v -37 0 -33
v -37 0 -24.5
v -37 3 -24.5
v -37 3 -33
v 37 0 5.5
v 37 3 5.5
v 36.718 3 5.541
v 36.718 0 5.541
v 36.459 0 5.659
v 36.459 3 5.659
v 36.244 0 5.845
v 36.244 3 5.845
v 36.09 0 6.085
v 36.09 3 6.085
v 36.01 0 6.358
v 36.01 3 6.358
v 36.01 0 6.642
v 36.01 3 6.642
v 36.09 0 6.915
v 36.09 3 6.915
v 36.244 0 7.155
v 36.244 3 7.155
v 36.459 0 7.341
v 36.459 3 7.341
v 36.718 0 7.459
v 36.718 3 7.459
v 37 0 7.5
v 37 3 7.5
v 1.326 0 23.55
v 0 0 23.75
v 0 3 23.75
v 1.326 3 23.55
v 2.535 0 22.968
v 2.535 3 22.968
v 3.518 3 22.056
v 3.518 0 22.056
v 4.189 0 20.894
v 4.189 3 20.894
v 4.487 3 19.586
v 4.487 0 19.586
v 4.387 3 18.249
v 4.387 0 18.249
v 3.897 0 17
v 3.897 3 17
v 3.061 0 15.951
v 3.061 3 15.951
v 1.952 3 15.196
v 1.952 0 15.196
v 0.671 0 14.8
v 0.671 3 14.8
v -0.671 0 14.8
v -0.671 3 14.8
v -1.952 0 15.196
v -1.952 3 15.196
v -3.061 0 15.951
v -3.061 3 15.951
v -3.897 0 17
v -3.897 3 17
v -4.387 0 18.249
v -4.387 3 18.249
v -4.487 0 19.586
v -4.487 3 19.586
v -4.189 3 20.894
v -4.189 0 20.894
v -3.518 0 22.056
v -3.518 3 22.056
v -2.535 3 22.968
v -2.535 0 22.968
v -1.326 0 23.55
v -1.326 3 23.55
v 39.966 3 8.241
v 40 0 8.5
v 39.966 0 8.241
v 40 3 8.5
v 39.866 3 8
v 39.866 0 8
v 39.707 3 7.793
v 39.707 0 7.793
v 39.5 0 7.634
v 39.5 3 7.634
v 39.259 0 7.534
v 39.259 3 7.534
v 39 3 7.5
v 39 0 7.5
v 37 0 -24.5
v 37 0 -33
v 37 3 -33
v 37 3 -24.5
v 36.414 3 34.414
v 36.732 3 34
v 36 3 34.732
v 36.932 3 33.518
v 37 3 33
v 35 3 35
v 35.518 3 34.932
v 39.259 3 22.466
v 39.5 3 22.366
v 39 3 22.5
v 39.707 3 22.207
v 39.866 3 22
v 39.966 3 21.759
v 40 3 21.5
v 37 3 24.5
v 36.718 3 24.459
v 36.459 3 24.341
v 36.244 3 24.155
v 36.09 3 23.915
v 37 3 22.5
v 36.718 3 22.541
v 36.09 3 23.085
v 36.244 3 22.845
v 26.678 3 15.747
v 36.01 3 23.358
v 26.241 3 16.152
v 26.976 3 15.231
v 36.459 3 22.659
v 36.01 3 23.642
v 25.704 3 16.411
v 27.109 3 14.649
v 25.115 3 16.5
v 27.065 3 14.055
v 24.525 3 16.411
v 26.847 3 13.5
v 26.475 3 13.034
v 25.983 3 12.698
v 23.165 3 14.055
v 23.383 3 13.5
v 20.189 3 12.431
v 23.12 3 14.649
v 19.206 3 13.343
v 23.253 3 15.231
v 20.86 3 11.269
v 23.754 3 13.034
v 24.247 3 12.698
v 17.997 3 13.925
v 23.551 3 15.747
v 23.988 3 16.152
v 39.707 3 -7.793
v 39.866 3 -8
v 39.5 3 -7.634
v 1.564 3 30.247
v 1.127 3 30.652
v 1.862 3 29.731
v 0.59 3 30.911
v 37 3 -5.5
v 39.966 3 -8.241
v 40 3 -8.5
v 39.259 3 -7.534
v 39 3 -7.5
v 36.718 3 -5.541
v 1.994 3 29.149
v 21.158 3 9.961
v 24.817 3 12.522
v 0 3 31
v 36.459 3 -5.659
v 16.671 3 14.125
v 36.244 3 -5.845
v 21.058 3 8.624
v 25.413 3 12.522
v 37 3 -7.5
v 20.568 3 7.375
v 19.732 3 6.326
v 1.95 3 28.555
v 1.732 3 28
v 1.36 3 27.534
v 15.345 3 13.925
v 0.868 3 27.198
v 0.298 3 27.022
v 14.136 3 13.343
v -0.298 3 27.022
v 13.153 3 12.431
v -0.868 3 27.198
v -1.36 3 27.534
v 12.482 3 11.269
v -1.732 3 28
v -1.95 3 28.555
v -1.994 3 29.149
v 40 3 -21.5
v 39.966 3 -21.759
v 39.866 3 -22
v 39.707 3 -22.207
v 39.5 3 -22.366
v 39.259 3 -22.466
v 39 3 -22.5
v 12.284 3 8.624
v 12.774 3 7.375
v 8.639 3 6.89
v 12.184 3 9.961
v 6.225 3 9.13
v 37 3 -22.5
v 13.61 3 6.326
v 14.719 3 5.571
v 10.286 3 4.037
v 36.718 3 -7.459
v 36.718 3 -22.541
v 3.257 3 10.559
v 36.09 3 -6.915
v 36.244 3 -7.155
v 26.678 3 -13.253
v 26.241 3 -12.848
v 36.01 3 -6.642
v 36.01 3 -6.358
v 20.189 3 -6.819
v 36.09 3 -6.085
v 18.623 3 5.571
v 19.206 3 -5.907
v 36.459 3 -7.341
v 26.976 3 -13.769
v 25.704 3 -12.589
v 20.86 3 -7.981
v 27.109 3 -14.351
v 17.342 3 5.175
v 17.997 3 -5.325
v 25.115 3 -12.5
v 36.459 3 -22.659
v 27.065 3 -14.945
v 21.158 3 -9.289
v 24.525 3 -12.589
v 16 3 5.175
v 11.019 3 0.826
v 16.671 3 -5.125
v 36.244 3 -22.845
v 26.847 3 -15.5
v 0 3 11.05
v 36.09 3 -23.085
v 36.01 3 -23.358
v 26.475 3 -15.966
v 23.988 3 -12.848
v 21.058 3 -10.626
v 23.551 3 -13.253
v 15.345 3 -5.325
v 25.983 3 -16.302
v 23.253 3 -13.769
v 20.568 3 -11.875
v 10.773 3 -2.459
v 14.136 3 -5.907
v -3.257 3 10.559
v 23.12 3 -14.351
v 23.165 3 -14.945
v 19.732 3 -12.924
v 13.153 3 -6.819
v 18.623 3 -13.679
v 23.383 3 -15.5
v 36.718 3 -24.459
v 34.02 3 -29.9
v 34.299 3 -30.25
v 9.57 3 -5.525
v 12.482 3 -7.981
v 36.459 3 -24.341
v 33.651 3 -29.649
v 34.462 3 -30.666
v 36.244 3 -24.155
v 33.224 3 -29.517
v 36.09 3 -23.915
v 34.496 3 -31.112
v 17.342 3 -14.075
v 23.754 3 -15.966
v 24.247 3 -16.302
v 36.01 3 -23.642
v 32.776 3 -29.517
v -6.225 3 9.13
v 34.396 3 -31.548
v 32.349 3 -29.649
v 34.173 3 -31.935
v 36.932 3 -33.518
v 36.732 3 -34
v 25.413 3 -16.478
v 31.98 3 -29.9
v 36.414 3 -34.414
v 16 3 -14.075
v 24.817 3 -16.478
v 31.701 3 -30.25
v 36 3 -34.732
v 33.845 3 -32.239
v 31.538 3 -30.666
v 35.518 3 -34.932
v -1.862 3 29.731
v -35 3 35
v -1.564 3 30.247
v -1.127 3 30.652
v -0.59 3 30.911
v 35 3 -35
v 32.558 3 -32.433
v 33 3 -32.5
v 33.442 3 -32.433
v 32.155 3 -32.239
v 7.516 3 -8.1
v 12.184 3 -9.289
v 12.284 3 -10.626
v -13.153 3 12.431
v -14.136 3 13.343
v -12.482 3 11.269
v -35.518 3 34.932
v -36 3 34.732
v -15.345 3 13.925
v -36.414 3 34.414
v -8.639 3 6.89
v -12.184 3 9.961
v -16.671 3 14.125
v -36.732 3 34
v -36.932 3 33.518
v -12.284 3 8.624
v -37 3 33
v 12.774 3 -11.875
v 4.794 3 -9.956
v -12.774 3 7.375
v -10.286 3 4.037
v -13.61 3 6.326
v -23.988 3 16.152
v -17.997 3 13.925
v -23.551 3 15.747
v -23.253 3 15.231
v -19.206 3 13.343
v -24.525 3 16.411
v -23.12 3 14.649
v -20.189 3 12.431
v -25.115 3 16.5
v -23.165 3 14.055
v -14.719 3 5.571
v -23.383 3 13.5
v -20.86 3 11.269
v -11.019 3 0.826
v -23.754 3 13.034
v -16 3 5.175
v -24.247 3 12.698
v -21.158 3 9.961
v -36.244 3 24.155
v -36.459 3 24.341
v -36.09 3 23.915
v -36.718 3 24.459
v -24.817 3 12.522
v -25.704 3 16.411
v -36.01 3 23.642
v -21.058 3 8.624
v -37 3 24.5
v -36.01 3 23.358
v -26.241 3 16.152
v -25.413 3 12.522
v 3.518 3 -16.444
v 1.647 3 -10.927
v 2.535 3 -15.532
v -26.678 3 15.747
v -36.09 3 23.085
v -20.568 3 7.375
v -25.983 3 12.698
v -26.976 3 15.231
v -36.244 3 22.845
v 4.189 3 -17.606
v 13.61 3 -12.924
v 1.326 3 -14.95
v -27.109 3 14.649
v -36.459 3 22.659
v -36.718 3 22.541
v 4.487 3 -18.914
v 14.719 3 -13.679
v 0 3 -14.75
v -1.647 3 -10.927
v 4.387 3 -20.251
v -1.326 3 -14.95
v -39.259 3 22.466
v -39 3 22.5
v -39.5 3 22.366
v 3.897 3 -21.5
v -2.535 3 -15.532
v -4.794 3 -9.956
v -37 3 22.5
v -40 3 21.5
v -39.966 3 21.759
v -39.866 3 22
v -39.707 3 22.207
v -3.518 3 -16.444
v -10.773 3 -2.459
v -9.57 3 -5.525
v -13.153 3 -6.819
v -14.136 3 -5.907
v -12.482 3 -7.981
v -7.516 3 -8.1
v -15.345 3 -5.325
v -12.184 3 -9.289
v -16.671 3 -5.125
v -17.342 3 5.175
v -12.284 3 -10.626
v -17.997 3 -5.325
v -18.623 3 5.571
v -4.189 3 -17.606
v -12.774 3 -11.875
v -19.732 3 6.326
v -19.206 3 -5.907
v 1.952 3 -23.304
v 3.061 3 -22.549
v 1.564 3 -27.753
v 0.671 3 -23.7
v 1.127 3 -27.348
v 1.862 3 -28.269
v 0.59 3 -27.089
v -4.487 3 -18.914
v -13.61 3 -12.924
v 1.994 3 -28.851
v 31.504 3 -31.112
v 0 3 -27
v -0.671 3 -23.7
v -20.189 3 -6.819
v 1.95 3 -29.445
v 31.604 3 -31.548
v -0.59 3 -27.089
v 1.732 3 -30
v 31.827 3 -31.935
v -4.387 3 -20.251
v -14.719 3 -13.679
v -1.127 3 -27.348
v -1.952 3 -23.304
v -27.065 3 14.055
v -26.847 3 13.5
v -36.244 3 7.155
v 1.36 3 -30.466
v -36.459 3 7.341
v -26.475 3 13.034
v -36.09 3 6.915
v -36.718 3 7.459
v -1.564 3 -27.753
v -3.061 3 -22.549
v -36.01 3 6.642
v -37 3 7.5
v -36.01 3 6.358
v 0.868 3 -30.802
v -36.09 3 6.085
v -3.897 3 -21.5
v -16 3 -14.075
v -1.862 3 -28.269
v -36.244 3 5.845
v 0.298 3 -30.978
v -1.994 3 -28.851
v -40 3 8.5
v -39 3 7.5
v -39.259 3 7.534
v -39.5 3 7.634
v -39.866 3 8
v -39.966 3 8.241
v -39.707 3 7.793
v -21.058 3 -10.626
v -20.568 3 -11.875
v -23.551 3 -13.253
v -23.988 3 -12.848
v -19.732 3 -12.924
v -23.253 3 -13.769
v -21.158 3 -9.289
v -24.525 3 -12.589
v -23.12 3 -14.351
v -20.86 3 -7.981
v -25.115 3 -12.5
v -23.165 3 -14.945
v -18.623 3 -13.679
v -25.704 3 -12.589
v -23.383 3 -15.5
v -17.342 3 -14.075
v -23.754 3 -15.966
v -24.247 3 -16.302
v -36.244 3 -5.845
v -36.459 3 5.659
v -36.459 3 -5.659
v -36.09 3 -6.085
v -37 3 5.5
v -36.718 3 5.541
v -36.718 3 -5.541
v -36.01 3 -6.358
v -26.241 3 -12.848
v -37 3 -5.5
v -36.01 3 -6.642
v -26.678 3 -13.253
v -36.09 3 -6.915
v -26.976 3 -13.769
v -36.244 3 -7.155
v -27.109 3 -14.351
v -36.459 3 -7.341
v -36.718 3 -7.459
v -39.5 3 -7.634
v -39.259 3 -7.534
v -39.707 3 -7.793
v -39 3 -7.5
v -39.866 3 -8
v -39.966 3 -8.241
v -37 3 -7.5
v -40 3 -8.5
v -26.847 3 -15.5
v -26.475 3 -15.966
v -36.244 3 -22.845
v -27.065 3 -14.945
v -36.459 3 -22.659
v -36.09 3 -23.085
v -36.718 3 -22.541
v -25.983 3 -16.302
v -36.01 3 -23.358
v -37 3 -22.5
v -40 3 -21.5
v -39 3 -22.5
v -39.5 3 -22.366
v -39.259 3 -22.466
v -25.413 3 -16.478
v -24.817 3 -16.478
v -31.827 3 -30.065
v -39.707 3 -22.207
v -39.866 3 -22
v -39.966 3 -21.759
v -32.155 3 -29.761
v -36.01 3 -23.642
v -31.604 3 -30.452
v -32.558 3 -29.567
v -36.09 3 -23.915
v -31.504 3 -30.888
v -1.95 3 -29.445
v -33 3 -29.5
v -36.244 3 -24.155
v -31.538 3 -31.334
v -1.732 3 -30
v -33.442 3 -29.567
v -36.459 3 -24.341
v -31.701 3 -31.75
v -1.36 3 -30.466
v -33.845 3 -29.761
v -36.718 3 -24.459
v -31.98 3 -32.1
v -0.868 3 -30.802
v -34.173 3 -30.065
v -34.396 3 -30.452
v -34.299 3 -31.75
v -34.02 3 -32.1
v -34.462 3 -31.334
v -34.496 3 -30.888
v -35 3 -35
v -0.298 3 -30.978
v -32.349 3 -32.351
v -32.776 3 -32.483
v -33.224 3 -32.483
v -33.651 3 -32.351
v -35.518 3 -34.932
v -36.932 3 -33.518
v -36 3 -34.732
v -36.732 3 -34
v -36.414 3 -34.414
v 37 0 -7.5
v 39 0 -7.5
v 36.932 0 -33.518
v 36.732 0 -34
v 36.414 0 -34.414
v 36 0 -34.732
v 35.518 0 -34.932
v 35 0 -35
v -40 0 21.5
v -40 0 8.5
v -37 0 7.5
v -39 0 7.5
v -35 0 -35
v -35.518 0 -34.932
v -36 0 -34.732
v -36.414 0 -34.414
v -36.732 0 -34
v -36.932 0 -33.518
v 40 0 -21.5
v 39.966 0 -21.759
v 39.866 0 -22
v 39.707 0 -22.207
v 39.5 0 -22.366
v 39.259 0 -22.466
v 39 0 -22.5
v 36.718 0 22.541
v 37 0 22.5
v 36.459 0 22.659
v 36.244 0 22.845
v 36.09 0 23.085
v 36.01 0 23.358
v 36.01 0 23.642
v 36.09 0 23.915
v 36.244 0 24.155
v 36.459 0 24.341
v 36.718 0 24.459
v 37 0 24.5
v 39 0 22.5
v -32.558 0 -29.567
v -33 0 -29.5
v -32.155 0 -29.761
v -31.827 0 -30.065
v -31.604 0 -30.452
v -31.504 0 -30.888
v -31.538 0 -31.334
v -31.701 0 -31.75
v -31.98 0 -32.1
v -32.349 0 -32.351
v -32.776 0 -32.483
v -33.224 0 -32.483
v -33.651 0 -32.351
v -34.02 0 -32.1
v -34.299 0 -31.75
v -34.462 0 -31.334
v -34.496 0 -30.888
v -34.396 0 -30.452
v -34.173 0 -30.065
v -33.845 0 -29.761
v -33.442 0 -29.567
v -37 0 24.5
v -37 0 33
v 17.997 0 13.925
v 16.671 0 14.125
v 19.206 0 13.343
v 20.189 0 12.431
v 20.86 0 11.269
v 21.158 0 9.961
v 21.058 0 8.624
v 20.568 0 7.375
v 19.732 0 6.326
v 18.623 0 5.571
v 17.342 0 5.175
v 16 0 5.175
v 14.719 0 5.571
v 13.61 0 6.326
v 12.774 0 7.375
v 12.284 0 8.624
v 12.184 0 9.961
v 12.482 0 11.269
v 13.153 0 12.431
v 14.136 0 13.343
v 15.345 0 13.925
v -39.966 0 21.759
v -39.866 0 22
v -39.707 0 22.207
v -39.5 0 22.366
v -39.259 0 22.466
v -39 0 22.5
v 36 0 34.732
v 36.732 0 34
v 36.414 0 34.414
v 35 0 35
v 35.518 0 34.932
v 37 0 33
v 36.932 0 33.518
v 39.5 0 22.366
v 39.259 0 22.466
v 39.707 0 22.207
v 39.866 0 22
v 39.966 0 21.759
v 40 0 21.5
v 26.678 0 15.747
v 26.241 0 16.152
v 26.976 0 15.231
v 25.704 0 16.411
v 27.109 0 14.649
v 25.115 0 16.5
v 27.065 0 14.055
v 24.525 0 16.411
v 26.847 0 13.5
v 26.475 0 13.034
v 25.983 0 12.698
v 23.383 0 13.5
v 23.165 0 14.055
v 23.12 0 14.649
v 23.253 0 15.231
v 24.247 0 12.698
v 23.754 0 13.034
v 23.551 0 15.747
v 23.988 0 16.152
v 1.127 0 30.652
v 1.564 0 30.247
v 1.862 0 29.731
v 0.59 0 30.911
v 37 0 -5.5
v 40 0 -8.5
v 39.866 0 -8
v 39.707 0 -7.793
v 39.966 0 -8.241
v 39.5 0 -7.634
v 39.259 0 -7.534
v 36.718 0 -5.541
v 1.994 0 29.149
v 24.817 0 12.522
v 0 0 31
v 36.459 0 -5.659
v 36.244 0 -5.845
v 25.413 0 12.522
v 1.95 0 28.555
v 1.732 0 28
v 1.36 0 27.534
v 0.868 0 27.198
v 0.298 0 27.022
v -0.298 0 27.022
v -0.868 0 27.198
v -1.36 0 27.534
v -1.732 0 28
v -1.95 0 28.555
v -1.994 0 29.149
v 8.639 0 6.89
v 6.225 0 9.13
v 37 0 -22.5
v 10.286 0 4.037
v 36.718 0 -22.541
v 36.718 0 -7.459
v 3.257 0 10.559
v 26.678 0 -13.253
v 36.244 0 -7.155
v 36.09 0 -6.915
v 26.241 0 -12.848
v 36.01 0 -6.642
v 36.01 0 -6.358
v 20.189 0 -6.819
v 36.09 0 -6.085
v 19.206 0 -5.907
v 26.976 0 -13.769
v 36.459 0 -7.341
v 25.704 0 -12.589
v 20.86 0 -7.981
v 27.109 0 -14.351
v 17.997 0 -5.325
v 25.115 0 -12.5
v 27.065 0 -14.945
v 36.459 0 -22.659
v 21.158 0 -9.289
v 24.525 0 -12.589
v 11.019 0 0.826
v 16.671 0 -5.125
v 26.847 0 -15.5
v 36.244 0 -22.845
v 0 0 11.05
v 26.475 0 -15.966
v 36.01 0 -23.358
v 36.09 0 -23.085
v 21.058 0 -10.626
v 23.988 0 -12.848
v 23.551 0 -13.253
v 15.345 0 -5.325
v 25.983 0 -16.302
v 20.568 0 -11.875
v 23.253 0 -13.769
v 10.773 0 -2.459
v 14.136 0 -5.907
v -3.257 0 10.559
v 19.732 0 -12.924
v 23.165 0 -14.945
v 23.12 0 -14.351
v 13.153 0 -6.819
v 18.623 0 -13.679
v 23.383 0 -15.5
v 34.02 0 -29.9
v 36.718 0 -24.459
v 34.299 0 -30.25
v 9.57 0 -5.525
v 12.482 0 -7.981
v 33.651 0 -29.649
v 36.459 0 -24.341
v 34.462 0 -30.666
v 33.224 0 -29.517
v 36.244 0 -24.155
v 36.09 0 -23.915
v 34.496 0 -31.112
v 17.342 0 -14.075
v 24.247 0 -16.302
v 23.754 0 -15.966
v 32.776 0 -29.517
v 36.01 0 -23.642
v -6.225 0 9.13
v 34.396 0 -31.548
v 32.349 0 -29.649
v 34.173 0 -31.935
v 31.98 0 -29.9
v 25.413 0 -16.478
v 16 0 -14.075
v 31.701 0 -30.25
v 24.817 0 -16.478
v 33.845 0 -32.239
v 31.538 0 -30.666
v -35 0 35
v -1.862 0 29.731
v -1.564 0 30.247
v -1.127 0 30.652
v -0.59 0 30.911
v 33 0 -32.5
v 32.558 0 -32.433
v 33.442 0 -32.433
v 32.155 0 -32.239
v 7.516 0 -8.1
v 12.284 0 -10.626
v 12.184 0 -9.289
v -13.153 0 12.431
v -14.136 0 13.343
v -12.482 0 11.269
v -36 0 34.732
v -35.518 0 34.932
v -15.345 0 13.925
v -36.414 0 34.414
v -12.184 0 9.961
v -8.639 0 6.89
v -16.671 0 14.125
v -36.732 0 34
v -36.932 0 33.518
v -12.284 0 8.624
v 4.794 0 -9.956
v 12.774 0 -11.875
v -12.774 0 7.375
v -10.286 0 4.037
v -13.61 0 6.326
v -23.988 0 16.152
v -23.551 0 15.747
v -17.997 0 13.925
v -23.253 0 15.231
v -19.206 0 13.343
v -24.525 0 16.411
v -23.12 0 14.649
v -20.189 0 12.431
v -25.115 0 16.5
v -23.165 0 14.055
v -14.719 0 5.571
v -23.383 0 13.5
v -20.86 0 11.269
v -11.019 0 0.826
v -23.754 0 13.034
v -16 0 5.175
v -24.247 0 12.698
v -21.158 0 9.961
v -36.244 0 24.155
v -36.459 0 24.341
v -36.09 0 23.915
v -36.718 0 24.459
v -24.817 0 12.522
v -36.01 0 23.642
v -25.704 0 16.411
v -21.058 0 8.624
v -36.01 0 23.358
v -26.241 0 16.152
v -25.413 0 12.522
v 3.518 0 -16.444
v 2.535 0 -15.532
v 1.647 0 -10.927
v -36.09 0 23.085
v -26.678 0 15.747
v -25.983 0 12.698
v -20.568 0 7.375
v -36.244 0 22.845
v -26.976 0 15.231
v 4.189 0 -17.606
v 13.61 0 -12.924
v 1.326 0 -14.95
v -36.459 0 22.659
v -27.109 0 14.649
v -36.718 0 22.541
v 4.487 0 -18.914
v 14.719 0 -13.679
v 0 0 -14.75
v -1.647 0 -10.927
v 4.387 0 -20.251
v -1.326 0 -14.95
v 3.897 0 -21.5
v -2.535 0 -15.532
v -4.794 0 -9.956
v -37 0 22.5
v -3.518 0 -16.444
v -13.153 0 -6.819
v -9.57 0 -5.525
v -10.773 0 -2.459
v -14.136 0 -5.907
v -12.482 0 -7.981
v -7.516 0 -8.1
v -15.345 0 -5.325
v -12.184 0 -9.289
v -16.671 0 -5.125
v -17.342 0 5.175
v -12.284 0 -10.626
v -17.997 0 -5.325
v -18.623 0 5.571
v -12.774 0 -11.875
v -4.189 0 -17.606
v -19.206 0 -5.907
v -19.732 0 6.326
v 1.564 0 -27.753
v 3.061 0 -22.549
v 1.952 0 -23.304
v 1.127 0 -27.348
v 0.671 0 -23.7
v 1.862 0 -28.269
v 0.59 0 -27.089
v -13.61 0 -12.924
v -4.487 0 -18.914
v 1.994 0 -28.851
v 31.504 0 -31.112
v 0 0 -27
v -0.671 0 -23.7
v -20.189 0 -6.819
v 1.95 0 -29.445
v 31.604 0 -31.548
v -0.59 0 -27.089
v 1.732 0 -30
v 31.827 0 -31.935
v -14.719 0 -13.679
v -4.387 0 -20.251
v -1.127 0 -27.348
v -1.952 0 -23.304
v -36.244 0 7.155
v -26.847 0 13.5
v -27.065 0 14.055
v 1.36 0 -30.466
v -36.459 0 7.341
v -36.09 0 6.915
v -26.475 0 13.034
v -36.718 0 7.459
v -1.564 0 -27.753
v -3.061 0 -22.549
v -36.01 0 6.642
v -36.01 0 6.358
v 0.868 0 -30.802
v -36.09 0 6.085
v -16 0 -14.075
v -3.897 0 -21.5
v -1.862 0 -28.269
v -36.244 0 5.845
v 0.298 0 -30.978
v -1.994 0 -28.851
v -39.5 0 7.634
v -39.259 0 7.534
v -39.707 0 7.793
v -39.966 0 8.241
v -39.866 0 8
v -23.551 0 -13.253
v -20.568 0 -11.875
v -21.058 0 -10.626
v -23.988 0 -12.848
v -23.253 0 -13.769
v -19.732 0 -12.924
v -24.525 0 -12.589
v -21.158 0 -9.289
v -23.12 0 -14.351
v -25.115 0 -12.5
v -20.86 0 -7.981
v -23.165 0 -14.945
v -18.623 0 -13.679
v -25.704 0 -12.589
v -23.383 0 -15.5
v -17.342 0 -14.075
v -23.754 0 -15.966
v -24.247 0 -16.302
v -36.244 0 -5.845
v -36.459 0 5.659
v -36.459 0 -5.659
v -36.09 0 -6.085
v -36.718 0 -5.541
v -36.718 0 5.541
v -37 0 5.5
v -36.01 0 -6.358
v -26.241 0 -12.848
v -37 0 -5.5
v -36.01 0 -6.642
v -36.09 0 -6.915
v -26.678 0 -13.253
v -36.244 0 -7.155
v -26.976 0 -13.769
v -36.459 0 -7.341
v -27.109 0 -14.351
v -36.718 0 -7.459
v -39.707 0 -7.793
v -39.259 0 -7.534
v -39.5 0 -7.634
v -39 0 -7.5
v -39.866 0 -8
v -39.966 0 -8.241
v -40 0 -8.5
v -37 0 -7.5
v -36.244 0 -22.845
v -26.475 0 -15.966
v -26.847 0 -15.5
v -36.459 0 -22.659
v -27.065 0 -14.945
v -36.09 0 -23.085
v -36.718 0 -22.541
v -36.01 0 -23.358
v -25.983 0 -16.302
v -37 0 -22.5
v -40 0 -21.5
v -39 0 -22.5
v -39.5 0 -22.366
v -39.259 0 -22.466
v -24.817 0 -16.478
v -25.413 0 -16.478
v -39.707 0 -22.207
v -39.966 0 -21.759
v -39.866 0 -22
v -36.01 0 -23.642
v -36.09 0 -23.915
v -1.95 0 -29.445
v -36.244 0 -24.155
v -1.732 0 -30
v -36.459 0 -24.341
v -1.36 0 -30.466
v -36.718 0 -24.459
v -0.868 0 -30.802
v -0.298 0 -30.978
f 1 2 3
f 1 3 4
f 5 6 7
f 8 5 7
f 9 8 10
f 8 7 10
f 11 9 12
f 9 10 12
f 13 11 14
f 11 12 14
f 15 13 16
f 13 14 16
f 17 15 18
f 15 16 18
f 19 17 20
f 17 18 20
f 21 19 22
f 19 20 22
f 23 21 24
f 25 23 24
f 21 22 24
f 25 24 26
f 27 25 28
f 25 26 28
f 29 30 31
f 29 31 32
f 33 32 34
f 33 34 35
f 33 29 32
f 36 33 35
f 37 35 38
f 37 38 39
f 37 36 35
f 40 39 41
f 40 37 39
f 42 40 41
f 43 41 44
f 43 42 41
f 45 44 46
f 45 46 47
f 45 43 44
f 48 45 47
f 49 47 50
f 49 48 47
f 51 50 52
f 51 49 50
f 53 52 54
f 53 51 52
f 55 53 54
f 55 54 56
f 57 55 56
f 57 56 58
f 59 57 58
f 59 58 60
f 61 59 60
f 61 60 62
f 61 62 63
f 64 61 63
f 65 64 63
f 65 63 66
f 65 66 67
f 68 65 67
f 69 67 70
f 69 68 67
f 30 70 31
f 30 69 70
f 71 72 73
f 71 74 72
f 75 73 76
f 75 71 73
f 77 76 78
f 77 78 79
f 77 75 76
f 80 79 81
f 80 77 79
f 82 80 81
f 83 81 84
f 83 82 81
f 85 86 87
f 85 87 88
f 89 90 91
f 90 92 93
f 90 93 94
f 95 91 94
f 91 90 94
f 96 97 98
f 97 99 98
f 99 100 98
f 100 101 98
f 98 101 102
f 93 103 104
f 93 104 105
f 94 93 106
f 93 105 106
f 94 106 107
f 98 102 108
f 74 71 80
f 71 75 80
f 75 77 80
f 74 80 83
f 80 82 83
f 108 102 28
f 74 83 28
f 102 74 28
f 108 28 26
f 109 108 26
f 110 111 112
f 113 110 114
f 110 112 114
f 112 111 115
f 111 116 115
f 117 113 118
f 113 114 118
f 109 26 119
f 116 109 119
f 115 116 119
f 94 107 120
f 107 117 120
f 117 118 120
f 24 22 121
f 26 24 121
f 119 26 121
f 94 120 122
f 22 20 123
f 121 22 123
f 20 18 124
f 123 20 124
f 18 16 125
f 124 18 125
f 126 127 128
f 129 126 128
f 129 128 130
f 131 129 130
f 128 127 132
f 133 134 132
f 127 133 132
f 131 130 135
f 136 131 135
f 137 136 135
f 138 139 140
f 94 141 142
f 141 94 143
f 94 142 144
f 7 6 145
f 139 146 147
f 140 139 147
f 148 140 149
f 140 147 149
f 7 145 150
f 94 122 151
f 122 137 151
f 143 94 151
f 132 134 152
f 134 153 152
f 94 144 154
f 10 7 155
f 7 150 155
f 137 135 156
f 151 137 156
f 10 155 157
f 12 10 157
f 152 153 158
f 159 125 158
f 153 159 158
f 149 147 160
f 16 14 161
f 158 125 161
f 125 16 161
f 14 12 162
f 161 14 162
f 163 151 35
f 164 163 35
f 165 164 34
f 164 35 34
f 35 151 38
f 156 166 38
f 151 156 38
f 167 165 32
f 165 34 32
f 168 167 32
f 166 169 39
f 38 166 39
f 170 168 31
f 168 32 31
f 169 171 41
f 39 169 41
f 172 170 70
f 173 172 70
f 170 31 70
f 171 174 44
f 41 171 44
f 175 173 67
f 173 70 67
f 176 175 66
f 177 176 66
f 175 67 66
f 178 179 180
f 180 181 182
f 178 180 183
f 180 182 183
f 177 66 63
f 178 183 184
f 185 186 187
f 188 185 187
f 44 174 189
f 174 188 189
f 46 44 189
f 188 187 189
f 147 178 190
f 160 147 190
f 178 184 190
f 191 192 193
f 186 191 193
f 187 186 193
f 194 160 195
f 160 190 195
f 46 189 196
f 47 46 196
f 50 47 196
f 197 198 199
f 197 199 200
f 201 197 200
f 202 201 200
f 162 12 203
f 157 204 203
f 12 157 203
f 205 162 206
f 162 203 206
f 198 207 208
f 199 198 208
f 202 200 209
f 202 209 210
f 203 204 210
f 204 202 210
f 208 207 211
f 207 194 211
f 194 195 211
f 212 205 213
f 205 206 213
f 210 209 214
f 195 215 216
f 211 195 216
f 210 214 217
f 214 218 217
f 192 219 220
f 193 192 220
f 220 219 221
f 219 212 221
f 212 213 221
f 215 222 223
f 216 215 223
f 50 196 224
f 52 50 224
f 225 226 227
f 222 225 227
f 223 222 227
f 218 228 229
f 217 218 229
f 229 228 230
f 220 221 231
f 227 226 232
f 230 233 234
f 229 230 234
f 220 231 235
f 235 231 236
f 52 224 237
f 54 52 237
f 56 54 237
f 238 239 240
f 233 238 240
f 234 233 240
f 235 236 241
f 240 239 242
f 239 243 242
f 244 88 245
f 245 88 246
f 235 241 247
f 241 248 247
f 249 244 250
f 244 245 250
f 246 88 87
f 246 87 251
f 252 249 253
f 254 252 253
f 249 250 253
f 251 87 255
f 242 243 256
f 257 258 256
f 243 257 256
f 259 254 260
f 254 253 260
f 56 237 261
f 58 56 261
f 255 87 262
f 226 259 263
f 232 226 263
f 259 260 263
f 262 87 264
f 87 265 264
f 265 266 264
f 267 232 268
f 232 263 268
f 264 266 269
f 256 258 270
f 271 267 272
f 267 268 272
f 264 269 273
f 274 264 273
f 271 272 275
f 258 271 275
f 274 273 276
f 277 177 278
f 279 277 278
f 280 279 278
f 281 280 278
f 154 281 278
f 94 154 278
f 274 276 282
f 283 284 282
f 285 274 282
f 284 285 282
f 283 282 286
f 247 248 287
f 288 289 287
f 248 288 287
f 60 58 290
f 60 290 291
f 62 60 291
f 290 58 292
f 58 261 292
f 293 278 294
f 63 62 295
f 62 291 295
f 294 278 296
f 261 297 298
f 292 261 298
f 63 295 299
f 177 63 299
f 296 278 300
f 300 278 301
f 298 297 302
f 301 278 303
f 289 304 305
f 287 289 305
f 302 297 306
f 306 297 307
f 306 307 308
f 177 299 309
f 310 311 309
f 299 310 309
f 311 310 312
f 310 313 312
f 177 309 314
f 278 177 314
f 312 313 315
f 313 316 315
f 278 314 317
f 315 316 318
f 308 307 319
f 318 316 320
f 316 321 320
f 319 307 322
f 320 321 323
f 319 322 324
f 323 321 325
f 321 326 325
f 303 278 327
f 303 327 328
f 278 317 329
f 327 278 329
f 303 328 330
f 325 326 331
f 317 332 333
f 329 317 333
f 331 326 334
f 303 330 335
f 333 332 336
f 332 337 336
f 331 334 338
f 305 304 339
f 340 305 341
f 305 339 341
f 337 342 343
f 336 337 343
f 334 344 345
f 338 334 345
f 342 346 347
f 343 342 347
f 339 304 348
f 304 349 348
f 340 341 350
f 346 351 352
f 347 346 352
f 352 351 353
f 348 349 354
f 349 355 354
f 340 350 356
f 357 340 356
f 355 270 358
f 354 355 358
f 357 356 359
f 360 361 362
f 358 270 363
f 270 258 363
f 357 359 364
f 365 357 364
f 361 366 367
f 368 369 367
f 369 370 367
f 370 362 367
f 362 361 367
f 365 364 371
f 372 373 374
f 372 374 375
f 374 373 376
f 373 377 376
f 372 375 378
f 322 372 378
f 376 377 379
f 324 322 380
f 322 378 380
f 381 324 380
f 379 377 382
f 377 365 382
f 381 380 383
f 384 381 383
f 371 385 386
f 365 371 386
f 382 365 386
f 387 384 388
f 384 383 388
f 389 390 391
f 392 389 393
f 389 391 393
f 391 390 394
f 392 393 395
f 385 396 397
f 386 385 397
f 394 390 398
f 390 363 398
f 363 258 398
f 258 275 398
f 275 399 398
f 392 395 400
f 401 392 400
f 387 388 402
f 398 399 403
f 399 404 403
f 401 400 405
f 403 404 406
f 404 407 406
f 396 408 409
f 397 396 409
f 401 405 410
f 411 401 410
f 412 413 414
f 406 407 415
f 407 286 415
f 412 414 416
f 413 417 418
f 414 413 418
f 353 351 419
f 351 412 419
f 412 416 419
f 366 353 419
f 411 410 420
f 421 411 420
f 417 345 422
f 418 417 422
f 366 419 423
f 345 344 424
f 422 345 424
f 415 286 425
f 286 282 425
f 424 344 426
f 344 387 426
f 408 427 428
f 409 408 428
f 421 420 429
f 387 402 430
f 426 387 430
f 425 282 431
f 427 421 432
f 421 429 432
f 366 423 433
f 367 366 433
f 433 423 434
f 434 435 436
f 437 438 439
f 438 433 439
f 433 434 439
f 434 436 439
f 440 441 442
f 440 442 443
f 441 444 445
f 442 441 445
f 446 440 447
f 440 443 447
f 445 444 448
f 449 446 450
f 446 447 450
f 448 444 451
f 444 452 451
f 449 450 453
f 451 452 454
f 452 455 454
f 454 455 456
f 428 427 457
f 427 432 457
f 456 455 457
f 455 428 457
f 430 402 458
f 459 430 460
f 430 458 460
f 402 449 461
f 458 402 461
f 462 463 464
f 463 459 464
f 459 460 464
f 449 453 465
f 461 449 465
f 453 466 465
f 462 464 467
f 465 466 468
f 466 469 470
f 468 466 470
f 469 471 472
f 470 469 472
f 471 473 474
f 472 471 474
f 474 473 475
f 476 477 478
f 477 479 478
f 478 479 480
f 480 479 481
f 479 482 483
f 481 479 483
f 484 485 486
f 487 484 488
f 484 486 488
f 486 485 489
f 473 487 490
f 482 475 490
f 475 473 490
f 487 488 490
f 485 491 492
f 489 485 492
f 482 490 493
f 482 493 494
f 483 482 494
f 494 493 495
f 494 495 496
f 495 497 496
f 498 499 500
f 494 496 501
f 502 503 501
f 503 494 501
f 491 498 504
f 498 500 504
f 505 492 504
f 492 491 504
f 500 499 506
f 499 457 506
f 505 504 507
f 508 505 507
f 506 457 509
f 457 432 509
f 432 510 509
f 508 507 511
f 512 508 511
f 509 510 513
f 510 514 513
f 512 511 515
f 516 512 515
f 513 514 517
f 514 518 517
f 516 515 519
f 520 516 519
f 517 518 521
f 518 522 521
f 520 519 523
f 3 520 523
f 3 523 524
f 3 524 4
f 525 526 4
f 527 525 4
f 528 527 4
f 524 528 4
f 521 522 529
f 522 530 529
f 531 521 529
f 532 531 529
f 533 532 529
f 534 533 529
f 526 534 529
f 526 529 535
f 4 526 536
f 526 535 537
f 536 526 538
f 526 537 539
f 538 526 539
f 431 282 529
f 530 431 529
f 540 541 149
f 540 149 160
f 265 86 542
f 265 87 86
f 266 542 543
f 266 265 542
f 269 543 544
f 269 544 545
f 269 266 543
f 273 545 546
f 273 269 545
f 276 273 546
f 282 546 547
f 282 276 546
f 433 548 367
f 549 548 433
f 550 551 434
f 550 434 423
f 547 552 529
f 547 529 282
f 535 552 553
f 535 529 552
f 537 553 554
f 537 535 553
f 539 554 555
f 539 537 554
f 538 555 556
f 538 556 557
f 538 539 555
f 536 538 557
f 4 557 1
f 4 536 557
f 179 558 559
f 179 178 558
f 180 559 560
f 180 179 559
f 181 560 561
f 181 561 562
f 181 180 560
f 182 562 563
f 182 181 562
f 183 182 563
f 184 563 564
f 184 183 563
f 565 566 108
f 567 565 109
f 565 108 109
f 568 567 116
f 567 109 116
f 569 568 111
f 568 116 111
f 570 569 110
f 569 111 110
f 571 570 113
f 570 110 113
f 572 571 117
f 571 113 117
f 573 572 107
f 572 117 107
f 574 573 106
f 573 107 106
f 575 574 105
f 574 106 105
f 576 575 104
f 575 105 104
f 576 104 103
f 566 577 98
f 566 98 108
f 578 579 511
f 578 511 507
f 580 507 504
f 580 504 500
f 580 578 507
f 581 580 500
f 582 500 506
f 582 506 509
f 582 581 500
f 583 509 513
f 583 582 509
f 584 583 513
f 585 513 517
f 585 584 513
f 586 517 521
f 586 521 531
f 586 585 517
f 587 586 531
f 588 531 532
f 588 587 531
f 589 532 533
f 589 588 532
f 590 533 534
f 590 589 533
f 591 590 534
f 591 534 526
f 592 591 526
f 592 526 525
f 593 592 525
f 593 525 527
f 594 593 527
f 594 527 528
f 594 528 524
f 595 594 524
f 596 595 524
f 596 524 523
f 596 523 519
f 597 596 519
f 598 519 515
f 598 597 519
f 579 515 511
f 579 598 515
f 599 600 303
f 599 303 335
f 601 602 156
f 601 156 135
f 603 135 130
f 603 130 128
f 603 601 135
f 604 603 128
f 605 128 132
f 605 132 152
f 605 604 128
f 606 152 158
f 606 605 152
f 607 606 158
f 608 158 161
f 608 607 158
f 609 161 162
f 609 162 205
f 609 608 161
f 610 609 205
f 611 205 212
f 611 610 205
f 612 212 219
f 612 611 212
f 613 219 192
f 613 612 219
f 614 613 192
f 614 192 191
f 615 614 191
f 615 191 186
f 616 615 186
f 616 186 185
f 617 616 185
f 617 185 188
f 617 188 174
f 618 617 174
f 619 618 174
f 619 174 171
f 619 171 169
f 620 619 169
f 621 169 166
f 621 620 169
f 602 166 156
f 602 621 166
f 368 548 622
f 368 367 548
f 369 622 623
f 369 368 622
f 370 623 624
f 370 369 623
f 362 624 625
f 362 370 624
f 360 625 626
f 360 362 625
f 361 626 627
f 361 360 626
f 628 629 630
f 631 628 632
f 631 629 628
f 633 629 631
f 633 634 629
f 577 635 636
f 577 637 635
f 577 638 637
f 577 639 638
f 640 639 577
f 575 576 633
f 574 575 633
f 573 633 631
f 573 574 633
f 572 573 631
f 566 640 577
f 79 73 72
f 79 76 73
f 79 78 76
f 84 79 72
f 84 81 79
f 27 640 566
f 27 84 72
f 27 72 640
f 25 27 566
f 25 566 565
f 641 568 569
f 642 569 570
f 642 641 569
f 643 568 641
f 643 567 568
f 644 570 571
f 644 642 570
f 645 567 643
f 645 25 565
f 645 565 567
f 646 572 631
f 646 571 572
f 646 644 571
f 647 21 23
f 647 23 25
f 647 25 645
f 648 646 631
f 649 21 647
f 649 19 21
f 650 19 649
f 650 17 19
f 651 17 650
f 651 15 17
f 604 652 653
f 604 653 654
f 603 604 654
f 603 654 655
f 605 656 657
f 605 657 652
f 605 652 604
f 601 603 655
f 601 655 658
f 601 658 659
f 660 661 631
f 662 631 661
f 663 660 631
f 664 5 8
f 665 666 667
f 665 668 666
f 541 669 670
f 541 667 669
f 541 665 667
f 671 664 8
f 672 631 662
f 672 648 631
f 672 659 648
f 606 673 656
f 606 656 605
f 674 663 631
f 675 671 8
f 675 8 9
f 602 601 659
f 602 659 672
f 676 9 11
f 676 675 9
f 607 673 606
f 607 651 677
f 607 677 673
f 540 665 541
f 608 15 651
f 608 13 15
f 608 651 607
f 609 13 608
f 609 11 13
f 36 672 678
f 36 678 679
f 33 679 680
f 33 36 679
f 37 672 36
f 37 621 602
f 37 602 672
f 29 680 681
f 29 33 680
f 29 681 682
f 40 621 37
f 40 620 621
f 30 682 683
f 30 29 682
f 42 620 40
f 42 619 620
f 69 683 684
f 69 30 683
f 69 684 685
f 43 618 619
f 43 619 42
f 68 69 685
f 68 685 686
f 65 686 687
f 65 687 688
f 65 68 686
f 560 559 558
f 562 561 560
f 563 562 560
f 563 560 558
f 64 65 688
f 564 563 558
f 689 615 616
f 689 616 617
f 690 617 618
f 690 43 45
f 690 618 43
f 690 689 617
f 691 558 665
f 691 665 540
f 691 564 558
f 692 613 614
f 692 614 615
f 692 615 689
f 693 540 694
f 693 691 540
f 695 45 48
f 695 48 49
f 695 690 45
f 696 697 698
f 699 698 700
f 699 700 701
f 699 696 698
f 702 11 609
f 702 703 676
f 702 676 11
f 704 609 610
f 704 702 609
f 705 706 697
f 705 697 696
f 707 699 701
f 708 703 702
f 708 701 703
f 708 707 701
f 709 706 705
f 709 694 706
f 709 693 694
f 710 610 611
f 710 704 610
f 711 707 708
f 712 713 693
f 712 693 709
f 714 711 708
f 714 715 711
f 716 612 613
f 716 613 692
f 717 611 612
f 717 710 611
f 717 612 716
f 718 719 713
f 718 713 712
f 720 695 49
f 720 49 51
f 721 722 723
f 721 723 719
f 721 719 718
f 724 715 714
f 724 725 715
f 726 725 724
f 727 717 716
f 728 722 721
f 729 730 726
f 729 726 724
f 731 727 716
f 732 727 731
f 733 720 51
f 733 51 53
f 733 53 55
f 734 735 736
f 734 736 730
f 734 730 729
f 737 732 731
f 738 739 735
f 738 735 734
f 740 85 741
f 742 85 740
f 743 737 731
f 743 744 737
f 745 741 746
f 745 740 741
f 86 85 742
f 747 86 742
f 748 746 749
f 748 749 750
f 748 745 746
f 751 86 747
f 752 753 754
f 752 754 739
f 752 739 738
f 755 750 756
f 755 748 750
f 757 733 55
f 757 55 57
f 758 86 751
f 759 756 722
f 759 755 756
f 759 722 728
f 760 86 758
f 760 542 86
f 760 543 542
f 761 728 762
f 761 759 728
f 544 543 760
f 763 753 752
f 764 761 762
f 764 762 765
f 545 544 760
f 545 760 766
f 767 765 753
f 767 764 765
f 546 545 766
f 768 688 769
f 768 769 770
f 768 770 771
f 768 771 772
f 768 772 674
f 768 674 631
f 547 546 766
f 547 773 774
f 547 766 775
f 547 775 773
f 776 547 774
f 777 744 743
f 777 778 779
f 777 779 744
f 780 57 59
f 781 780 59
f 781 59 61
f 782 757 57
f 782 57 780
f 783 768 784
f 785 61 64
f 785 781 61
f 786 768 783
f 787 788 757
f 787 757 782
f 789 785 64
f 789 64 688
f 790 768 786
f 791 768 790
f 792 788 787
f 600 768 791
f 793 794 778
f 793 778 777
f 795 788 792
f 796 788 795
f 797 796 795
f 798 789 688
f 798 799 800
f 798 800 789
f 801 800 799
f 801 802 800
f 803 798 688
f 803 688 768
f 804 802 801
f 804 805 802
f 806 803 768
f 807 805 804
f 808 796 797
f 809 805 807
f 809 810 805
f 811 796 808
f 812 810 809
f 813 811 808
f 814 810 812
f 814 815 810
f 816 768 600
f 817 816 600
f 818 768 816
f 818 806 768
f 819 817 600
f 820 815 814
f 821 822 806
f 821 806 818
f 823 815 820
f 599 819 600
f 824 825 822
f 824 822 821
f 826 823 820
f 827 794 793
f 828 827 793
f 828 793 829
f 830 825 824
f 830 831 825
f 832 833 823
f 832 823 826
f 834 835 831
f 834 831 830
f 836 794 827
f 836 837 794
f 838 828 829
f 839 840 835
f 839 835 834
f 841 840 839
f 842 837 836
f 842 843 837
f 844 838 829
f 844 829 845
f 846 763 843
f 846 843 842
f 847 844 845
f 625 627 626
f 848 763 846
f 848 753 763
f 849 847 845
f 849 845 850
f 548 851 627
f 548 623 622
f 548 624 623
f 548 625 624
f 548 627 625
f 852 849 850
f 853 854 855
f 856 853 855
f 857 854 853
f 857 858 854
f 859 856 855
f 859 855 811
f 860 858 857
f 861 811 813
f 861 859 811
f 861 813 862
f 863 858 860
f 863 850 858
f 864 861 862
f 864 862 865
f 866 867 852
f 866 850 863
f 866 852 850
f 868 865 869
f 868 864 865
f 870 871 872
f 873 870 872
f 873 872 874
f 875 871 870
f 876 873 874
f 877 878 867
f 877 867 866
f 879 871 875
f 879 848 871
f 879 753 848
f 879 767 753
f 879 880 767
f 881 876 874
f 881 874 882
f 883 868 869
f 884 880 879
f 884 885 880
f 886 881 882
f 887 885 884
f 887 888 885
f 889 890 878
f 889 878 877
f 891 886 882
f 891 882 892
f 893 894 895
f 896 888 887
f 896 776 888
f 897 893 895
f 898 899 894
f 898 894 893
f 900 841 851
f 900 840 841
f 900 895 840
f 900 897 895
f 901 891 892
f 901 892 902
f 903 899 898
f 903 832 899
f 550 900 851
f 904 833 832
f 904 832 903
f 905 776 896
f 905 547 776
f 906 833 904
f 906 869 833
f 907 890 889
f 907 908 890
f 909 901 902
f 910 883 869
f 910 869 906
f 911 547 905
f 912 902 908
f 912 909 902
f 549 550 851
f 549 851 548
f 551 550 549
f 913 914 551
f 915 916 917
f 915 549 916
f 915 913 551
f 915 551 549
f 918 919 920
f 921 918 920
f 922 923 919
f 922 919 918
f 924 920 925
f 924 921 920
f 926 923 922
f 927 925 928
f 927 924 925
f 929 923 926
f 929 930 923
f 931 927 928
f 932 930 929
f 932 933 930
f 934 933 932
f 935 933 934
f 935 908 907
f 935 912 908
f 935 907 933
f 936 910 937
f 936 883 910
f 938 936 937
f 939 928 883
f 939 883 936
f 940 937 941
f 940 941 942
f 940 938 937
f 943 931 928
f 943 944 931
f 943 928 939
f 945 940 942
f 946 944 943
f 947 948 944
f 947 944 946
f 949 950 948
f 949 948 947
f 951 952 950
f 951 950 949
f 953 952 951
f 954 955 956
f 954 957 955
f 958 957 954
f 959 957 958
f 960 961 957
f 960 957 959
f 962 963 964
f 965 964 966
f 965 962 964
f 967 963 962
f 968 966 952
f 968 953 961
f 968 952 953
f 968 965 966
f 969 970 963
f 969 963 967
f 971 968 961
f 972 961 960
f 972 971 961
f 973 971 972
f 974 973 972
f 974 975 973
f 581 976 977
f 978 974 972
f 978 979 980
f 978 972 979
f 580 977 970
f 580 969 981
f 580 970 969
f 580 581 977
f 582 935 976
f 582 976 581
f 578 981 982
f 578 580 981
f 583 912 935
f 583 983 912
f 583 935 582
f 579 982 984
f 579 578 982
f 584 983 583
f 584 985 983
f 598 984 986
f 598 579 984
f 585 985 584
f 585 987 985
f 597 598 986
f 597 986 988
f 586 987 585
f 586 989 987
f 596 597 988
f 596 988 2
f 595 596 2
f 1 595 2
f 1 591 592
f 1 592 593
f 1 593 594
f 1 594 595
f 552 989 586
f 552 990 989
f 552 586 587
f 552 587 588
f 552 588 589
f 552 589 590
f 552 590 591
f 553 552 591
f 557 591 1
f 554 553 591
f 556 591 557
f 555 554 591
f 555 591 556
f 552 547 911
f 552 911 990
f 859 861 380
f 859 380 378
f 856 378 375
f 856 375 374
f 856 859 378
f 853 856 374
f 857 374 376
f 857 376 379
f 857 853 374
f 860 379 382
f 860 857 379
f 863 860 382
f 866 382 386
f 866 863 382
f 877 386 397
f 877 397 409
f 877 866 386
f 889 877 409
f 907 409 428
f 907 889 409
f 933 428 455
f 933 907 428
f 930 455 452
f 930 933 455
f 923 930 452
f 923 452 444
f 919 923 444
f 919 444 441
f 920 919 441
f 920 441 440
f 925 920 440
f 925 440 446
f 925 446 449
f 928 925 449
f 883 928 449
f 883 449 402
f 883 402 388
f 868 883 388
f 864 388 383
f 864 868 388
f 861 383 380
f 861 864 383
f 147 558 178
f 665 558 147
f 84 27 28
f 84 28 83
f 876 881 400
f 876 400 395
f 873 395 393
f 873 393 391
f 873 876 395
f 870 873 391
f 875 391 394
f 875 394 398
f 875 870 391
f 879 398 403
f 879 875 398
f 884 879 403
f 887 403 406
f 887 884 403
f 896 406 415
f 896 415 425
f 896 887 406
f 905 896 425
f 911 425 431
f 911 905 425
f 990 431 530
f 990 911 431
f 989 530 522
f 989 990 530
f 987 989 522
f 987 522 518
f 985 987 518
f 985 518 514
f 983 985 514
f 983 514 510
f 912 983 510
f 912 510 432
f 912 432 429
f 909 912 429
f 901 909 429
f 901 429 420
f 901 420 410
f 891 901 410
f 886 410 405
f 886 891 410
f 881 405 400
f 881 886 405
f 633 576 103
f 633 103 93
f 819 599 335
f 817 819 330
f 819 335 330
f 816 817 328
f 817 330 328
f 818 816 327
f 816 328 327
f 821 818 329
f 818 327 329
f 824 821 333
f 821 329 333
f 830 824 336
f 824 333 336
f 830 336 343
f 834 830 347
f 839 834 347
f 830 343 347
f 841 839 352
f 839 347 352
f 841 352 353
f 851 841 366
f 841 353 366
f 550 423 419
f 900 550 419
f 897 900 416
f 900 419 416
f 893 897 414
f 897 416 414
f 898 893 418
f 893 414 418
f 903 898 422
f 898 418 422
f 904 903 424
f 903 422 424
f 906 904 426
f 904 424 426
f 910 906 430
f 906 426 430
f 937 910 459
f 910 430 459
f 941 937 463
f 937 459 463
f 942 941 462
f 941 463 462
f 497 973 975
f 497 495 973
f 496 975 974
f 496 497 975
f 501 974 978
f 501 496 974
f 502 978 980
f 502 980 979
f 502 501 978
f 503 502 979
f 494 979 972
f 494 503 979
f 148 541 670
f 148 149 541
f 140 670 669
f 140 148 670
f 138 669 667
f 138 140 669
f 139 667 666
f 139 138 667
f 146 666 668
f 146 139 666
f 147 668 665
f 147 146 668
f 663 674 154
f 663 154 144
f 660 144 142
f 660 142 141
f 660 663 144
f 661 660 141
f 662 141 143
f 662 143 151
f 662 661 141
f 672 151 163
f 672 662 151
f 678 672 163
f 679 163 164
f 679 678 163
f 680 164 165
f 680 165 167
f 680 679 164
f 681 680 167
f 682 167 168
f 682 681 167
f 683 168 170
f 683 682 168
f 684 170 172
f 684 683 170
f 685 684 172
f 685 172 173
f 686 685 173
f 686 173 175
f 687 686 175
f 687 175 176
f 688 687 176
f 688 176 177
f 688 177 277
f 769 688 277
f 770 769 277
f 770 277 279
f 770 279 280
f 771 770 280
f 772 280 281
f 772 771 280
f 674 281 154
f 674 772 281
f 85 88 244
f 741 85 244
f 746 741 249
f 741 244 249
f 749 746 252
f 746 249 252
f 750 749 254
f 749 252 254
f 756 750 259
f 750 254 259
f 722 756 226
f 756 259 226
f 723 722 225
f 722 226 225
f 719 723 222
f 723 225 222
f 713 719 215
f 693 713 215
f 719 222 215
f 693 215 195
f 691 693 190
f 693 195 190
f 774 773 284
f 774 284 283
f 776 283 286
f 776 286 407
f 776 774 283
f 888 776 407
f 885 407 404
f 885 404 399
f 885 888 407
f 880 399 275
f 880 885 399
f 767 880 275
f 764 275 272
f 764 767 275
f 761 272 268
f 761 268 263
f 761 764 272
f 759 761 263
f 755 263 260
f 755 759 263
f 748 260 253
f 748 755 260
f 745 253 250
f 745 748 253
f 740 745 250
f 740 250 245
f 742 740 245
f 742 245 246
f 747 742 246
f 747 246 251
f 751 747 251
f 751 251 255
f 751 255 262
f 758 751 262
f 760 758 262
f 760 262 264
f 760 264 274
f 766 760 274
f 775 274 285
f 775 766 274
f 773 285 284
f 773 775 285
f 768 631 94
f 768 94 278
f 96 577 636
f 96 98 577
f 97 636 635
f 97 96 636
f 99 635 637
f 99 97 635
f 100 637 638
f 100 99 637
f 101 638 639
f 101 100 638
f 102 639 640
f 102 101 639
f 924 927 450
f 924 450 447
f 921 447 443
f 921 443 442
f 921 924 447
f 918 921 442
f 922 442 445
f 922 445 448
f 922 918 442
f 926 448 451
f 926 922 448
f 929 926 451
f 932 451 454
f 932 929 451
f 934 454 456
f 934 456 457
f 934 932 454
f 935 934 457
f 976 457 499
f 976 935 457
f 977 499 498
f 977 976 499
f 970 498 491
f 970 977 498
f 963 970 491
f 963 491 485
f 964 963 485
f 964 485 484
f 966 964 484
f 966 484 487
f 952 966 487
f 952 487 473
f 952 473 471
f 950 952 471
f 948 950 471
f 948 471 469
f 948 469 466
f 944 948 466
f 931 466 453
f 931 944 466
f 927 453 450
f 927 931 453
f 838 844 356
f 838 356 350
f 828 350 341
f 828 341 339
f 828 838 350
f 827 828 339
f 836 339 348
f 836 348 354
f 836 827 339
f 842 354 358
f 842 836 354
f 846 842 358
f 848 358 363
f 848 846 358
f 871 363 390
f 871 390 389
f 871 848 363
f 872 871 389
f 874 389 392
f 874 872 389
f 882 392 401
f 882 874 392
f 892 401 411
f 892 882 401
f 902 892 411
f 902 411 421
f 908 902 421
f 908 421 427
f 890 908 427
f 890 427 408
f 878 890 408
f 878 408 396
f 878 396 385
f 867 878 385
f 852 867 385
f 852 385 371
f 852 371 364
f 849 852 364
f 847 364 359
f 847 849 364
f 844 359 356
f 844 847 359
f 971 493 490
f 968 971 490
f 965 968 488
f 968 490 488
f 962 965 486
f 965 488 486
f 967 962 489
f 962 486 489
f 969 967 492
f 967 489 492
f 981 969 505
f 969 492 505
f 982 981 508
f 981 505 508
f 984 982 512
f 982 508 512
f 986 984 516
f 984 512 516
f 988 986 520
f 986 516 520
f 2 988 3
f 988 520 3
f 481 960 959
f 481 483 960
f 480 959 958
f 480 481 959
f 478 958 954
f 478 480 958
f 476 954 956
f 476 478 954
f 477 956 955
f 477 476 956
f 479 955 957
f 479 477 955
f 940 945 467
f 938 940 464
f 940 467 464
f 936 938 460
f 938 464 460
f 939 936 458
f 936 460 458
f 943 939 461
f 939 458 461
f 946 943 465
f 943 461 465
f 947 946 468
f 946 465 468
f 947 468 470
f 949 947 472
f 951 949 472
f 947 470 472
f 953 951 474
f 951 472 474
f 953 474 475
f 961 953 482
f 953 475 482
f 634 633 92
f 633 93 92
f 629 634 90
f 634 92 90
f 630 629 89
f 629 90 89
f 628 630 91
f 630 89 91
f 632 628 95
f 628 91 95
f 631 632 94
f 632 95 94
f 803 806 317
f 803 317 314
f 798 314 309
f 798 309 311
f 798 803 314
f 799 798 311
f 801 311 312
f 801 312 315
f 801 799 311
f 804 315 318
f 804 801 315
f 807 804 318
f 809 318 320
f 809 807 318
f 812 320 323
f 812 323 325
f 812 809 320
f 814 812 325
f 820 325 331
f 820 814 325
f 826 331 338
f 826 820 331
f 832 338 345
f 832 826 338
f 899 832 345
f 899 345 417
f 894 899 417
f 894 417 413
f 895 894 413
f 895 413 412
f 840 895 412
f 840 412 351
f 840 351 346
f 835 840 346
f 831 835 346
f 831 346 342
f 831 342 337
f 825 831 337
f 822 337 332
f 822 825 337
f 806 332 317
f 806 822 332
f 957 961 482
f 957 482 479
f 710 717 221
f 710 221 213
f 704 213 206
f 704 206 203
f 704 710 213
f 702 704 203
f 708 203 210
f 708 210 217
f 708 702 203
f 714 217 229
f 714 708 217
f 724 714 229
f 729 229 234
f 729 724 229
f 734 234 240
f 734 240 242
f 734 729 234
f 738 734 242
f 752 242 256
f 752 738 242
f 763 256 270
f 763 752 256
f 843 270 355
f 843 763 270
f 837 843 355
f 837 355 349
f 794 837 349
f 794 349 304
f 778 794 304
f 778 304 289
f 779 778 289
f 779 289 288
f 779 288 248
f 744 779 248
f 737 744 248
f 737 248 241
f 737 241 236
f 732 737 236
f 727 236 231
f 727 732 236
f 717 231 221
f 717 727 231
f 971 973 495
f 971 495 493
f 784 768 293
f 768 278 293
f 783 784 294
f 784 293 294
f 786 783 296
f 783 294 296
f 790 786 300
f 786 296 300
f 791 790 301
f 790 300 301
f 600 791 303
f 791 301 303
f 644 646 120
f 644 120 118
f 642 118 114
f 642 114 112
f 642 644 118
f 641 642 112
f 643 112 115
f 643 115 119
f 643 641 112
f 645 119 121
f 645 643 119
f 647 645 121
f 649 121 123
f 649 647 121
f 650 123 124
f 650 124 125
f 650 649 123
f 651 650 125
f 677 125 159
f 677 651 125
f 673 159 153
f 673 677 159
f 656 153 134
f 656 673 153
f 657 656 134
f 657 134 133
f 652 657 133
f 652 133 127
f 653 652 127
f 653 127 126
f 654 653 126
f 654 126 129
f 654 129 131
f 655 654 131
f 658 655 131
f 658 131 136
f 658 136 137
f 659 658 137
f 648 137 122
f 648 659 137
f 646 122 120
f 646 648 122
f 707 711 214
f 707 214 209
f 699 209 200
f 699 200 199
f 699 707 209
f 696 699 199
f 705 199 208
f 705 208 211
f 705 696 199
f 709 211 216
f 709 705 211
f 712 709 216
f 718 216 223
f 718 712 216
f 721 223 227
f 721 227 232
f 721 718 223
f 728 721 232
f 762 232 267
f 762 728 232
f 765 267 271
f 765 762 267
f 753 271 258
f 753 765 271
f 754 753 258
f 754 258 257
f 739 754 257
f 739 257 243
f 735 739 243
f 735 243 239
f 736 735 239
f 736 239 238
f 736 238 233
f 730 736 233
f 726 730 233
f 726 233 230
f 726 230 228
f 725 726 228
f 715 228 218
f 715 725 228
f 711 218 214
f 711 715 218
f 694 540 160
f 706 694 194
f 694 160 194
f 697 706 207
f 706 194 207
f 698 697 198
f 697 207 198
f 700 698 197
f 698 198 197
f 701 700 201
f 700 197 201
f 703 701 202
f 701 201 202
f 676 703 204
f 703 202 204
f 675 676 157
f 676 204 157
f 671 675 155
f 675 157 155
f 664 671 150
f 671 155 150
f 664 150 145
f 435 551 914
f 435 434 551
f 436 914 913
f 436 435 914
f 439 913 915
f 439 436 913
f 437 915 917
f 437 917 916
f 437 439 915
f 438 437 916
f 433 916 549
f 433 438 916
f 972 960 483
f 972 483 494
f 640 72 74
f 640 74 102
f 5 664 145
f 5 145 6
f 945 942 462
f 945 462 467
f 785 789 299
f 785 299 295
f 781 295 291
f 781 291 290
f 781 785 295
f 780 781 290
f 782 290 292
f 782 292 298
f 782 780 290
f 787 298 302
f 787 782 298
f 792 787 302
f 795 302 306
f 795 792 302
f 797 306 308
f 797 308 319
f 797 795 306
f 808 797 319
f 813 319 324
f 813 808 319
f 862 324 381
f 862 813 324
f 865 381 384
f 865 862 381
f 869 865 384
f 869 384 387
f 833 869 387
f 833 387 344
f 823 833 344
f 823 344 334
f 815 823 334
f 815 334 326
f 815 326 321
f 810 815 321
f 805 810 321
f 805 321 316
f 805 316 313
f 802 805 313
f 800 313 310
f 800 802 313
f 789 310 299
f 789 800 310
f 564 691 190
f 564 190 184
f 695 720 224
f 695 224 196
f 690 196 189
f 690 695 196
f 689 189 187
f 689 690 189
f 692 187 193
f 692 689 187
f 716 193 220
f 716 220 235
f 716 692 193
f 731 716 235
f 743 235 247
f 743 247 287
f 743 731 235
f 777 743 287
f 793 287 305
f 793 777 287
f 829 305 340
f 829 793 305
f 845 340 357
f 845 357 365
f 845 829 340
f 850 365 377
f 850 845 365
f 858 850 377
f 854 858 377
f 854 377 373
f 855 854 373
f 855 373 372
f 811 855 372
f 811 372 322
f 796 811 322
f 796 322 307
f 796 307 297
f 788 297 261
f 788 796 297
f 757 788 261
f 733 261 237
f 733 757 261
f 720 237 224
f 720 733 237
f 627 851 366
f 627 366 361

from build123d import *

# Parameters (mm, degrees)
SKETCH_2_R          = 11.05
SKETCH_2_R_2        = 2
SKETCH_2_R_3        = 4.5
SKETCH_2_R_4        = 1.5
EXTRUDE_1_DEPTH     = 3
SKETCH_3_R          = 1
CUT_EXTRUDE_1_DEPTH = 54.235326617
FILLET_1_R          = 1
FILLET_2_R          = 2


with BuildPart() as part:
    # 草图2 → 凸台-拉伸1 (new body)
    with BuildSketch(Plane(origin=(0, 0, 0), x_dir=(1, 0, 0), z_dir=(0, 1, 0))):
        Polygon((-37, 35), (37, 35), (37, 22.5), (40, 22.5), (40, 7.5), (37, 7.5), (37, -7.5), (40, -7.5), (40, -22.5), (37, -22.5), (37, -35), (-37, -35), (-37, -22.5), (-40, -22.5), (-40, -7.5), (-37, -7.5), (-37, 7.5), (-40, 7.5), (-40, 22.5), (-37, 22.5), align=None)
        with Locations(Location((0, 0, 0), (0, 0, 270))):
            Circle(SKETCH_2_R, mode=Mode.SUBTRACT)
        with Locations(Location((0, 29, 0), (0, 0, 270))):
            Circle(SKETCH_2_R_2, mode=Mode.SUBTRACT)
        with Locations(Location((0, 19.25, 0), (0, 0, 270))):
            Circle(SKETCH_2_R_3, mode=Mode.SUBTRACT)
        with Locations(Location((-33, 31, 0), (0, 0, 270))):
            Circle(SKETCH_2_R_4, mode=Mode.SUBTRACT)
        with Locations(Location((25.11473671, 14.5, 0), (0, 0, 270))):
            Circle(SKETCH_2_R_2, mode=Mode.SUBTRACT)
        with Locations(Location((16.670989023, 9.625, 0), (0, 0, 270))):
            Circle(SKETCH_2_R_3, mode=Mode.SUBTRACT)
        with Locations(Location((25.11473671, -14.5, 0), (0, 0, 270))):
            Circle(SKETCH_2_R_2, mode=Mode.SUBTRACT)
        with Locations(Location((16.670989023, -9.625, 0), (0, 0, 270))):
            Circle(SKETCH_2_R_3, mode=Mode.SUBTRACT)
        with Locations(Location((0, -29, 0), (0, 0, 270))):
            Circle(SKETCH_2_R_2, mode=Mode.SUBTRACT)
        with Locations(Location((0, -19.25, 0), (0, 0, 270))):
            Circle(SKETCH_2_R_3, mode=Mode.SUBTRACT)
        with Locations(Location((-25.11473671, -14.5, 0), (0, 0, 270))):
            Circle(SKETCH_2_R_2, mode=Mode.SUBTRACT)
        with Locations(Location((-16.670989023, -9.625, 0), (0, 0, 270))):
            Circle(SKETCH_2_R_3, mode=Mode.SUBTRACT)
        with Locations(Location((-25.11473671, 14.5, 0), (0, 0, 270))):
            Circle(SKETCH_2_R_2, mode=Mode.SUBTRACT)
        with Locations(Location((-16.670989023, 9.625, 0), (0, 0, 270))):
            Circle(SKETCH_2_R_3, mode=Mode.SUBTRACT)
        with Locations(Location((33, 31, 0), (0, 0, 90))):
            Circle(SKETCH_2_R_4, mode=Mode.SUBTRACT)
    extrude(amount=EXTRUDE_1_DEPTH)

    # 草图3 → 切除-拉伸1 (cut, through all)
    with BuildSketch(Plane(origin=(0, 3, 0), x_dir=(1, 0, 0), z_dir=(0, 1, 0))):
        with Locations((-37, 23.5)):
            Circle(SKETCH_3_R)
        with Locations((-37, 6.5)):
            Circle(SKETCH_3_R)
        with Locations((-37, -6.5)):
            Circle(SKETCH_3_R)
        with Locations((-37, -23.5)):
            Circle(SKETCH_3_R)
        with Locations((37, -23.5)):
            Circle(SKETCH_3_R)
        with Locations((37, -6.5)):
            Circle(SKETCH_3_R)
        with Locations((37, 6.5)):
            Circle(SKETCH_3_R)
        with Locations((37, 23.5)):
            Circle(SKETCH_3_R)
    extrude(amount=-CUT_EXTRUDE_1_DEPTH, mode=Mode.SUBTRACT)

    # 圆角1
    fillet_1_edges = [part.edges().sort_by_distance(p)[0] for p in [
        (40, 1.5, -22.5),
        (40, 1.5, -7.5),
        (40, 1.5, 7.5),
        (40, 1.5, 22.5),
        (-40, 1.5, 22.5),
        (-40, 1.5, 7.5),
        (-40, 1.5, -7.5),
        (-40, 1.5, -22.5),
    ]]
    fillet(fillet_1_edges, radius=FILLET_1_R)

    # 圆角2
    fillet_2_edges = [part.edges().sort_by_distance(p)[0] for p in [
        (-37, 1.5, -35),
        (37, 1.5, -35),
        (37, 1.5, 35),
        (-37, 1.5, 35),
    ]]
    fillet(fillet_2_edges, radius=FILLET_2_R)


solid = part.part
